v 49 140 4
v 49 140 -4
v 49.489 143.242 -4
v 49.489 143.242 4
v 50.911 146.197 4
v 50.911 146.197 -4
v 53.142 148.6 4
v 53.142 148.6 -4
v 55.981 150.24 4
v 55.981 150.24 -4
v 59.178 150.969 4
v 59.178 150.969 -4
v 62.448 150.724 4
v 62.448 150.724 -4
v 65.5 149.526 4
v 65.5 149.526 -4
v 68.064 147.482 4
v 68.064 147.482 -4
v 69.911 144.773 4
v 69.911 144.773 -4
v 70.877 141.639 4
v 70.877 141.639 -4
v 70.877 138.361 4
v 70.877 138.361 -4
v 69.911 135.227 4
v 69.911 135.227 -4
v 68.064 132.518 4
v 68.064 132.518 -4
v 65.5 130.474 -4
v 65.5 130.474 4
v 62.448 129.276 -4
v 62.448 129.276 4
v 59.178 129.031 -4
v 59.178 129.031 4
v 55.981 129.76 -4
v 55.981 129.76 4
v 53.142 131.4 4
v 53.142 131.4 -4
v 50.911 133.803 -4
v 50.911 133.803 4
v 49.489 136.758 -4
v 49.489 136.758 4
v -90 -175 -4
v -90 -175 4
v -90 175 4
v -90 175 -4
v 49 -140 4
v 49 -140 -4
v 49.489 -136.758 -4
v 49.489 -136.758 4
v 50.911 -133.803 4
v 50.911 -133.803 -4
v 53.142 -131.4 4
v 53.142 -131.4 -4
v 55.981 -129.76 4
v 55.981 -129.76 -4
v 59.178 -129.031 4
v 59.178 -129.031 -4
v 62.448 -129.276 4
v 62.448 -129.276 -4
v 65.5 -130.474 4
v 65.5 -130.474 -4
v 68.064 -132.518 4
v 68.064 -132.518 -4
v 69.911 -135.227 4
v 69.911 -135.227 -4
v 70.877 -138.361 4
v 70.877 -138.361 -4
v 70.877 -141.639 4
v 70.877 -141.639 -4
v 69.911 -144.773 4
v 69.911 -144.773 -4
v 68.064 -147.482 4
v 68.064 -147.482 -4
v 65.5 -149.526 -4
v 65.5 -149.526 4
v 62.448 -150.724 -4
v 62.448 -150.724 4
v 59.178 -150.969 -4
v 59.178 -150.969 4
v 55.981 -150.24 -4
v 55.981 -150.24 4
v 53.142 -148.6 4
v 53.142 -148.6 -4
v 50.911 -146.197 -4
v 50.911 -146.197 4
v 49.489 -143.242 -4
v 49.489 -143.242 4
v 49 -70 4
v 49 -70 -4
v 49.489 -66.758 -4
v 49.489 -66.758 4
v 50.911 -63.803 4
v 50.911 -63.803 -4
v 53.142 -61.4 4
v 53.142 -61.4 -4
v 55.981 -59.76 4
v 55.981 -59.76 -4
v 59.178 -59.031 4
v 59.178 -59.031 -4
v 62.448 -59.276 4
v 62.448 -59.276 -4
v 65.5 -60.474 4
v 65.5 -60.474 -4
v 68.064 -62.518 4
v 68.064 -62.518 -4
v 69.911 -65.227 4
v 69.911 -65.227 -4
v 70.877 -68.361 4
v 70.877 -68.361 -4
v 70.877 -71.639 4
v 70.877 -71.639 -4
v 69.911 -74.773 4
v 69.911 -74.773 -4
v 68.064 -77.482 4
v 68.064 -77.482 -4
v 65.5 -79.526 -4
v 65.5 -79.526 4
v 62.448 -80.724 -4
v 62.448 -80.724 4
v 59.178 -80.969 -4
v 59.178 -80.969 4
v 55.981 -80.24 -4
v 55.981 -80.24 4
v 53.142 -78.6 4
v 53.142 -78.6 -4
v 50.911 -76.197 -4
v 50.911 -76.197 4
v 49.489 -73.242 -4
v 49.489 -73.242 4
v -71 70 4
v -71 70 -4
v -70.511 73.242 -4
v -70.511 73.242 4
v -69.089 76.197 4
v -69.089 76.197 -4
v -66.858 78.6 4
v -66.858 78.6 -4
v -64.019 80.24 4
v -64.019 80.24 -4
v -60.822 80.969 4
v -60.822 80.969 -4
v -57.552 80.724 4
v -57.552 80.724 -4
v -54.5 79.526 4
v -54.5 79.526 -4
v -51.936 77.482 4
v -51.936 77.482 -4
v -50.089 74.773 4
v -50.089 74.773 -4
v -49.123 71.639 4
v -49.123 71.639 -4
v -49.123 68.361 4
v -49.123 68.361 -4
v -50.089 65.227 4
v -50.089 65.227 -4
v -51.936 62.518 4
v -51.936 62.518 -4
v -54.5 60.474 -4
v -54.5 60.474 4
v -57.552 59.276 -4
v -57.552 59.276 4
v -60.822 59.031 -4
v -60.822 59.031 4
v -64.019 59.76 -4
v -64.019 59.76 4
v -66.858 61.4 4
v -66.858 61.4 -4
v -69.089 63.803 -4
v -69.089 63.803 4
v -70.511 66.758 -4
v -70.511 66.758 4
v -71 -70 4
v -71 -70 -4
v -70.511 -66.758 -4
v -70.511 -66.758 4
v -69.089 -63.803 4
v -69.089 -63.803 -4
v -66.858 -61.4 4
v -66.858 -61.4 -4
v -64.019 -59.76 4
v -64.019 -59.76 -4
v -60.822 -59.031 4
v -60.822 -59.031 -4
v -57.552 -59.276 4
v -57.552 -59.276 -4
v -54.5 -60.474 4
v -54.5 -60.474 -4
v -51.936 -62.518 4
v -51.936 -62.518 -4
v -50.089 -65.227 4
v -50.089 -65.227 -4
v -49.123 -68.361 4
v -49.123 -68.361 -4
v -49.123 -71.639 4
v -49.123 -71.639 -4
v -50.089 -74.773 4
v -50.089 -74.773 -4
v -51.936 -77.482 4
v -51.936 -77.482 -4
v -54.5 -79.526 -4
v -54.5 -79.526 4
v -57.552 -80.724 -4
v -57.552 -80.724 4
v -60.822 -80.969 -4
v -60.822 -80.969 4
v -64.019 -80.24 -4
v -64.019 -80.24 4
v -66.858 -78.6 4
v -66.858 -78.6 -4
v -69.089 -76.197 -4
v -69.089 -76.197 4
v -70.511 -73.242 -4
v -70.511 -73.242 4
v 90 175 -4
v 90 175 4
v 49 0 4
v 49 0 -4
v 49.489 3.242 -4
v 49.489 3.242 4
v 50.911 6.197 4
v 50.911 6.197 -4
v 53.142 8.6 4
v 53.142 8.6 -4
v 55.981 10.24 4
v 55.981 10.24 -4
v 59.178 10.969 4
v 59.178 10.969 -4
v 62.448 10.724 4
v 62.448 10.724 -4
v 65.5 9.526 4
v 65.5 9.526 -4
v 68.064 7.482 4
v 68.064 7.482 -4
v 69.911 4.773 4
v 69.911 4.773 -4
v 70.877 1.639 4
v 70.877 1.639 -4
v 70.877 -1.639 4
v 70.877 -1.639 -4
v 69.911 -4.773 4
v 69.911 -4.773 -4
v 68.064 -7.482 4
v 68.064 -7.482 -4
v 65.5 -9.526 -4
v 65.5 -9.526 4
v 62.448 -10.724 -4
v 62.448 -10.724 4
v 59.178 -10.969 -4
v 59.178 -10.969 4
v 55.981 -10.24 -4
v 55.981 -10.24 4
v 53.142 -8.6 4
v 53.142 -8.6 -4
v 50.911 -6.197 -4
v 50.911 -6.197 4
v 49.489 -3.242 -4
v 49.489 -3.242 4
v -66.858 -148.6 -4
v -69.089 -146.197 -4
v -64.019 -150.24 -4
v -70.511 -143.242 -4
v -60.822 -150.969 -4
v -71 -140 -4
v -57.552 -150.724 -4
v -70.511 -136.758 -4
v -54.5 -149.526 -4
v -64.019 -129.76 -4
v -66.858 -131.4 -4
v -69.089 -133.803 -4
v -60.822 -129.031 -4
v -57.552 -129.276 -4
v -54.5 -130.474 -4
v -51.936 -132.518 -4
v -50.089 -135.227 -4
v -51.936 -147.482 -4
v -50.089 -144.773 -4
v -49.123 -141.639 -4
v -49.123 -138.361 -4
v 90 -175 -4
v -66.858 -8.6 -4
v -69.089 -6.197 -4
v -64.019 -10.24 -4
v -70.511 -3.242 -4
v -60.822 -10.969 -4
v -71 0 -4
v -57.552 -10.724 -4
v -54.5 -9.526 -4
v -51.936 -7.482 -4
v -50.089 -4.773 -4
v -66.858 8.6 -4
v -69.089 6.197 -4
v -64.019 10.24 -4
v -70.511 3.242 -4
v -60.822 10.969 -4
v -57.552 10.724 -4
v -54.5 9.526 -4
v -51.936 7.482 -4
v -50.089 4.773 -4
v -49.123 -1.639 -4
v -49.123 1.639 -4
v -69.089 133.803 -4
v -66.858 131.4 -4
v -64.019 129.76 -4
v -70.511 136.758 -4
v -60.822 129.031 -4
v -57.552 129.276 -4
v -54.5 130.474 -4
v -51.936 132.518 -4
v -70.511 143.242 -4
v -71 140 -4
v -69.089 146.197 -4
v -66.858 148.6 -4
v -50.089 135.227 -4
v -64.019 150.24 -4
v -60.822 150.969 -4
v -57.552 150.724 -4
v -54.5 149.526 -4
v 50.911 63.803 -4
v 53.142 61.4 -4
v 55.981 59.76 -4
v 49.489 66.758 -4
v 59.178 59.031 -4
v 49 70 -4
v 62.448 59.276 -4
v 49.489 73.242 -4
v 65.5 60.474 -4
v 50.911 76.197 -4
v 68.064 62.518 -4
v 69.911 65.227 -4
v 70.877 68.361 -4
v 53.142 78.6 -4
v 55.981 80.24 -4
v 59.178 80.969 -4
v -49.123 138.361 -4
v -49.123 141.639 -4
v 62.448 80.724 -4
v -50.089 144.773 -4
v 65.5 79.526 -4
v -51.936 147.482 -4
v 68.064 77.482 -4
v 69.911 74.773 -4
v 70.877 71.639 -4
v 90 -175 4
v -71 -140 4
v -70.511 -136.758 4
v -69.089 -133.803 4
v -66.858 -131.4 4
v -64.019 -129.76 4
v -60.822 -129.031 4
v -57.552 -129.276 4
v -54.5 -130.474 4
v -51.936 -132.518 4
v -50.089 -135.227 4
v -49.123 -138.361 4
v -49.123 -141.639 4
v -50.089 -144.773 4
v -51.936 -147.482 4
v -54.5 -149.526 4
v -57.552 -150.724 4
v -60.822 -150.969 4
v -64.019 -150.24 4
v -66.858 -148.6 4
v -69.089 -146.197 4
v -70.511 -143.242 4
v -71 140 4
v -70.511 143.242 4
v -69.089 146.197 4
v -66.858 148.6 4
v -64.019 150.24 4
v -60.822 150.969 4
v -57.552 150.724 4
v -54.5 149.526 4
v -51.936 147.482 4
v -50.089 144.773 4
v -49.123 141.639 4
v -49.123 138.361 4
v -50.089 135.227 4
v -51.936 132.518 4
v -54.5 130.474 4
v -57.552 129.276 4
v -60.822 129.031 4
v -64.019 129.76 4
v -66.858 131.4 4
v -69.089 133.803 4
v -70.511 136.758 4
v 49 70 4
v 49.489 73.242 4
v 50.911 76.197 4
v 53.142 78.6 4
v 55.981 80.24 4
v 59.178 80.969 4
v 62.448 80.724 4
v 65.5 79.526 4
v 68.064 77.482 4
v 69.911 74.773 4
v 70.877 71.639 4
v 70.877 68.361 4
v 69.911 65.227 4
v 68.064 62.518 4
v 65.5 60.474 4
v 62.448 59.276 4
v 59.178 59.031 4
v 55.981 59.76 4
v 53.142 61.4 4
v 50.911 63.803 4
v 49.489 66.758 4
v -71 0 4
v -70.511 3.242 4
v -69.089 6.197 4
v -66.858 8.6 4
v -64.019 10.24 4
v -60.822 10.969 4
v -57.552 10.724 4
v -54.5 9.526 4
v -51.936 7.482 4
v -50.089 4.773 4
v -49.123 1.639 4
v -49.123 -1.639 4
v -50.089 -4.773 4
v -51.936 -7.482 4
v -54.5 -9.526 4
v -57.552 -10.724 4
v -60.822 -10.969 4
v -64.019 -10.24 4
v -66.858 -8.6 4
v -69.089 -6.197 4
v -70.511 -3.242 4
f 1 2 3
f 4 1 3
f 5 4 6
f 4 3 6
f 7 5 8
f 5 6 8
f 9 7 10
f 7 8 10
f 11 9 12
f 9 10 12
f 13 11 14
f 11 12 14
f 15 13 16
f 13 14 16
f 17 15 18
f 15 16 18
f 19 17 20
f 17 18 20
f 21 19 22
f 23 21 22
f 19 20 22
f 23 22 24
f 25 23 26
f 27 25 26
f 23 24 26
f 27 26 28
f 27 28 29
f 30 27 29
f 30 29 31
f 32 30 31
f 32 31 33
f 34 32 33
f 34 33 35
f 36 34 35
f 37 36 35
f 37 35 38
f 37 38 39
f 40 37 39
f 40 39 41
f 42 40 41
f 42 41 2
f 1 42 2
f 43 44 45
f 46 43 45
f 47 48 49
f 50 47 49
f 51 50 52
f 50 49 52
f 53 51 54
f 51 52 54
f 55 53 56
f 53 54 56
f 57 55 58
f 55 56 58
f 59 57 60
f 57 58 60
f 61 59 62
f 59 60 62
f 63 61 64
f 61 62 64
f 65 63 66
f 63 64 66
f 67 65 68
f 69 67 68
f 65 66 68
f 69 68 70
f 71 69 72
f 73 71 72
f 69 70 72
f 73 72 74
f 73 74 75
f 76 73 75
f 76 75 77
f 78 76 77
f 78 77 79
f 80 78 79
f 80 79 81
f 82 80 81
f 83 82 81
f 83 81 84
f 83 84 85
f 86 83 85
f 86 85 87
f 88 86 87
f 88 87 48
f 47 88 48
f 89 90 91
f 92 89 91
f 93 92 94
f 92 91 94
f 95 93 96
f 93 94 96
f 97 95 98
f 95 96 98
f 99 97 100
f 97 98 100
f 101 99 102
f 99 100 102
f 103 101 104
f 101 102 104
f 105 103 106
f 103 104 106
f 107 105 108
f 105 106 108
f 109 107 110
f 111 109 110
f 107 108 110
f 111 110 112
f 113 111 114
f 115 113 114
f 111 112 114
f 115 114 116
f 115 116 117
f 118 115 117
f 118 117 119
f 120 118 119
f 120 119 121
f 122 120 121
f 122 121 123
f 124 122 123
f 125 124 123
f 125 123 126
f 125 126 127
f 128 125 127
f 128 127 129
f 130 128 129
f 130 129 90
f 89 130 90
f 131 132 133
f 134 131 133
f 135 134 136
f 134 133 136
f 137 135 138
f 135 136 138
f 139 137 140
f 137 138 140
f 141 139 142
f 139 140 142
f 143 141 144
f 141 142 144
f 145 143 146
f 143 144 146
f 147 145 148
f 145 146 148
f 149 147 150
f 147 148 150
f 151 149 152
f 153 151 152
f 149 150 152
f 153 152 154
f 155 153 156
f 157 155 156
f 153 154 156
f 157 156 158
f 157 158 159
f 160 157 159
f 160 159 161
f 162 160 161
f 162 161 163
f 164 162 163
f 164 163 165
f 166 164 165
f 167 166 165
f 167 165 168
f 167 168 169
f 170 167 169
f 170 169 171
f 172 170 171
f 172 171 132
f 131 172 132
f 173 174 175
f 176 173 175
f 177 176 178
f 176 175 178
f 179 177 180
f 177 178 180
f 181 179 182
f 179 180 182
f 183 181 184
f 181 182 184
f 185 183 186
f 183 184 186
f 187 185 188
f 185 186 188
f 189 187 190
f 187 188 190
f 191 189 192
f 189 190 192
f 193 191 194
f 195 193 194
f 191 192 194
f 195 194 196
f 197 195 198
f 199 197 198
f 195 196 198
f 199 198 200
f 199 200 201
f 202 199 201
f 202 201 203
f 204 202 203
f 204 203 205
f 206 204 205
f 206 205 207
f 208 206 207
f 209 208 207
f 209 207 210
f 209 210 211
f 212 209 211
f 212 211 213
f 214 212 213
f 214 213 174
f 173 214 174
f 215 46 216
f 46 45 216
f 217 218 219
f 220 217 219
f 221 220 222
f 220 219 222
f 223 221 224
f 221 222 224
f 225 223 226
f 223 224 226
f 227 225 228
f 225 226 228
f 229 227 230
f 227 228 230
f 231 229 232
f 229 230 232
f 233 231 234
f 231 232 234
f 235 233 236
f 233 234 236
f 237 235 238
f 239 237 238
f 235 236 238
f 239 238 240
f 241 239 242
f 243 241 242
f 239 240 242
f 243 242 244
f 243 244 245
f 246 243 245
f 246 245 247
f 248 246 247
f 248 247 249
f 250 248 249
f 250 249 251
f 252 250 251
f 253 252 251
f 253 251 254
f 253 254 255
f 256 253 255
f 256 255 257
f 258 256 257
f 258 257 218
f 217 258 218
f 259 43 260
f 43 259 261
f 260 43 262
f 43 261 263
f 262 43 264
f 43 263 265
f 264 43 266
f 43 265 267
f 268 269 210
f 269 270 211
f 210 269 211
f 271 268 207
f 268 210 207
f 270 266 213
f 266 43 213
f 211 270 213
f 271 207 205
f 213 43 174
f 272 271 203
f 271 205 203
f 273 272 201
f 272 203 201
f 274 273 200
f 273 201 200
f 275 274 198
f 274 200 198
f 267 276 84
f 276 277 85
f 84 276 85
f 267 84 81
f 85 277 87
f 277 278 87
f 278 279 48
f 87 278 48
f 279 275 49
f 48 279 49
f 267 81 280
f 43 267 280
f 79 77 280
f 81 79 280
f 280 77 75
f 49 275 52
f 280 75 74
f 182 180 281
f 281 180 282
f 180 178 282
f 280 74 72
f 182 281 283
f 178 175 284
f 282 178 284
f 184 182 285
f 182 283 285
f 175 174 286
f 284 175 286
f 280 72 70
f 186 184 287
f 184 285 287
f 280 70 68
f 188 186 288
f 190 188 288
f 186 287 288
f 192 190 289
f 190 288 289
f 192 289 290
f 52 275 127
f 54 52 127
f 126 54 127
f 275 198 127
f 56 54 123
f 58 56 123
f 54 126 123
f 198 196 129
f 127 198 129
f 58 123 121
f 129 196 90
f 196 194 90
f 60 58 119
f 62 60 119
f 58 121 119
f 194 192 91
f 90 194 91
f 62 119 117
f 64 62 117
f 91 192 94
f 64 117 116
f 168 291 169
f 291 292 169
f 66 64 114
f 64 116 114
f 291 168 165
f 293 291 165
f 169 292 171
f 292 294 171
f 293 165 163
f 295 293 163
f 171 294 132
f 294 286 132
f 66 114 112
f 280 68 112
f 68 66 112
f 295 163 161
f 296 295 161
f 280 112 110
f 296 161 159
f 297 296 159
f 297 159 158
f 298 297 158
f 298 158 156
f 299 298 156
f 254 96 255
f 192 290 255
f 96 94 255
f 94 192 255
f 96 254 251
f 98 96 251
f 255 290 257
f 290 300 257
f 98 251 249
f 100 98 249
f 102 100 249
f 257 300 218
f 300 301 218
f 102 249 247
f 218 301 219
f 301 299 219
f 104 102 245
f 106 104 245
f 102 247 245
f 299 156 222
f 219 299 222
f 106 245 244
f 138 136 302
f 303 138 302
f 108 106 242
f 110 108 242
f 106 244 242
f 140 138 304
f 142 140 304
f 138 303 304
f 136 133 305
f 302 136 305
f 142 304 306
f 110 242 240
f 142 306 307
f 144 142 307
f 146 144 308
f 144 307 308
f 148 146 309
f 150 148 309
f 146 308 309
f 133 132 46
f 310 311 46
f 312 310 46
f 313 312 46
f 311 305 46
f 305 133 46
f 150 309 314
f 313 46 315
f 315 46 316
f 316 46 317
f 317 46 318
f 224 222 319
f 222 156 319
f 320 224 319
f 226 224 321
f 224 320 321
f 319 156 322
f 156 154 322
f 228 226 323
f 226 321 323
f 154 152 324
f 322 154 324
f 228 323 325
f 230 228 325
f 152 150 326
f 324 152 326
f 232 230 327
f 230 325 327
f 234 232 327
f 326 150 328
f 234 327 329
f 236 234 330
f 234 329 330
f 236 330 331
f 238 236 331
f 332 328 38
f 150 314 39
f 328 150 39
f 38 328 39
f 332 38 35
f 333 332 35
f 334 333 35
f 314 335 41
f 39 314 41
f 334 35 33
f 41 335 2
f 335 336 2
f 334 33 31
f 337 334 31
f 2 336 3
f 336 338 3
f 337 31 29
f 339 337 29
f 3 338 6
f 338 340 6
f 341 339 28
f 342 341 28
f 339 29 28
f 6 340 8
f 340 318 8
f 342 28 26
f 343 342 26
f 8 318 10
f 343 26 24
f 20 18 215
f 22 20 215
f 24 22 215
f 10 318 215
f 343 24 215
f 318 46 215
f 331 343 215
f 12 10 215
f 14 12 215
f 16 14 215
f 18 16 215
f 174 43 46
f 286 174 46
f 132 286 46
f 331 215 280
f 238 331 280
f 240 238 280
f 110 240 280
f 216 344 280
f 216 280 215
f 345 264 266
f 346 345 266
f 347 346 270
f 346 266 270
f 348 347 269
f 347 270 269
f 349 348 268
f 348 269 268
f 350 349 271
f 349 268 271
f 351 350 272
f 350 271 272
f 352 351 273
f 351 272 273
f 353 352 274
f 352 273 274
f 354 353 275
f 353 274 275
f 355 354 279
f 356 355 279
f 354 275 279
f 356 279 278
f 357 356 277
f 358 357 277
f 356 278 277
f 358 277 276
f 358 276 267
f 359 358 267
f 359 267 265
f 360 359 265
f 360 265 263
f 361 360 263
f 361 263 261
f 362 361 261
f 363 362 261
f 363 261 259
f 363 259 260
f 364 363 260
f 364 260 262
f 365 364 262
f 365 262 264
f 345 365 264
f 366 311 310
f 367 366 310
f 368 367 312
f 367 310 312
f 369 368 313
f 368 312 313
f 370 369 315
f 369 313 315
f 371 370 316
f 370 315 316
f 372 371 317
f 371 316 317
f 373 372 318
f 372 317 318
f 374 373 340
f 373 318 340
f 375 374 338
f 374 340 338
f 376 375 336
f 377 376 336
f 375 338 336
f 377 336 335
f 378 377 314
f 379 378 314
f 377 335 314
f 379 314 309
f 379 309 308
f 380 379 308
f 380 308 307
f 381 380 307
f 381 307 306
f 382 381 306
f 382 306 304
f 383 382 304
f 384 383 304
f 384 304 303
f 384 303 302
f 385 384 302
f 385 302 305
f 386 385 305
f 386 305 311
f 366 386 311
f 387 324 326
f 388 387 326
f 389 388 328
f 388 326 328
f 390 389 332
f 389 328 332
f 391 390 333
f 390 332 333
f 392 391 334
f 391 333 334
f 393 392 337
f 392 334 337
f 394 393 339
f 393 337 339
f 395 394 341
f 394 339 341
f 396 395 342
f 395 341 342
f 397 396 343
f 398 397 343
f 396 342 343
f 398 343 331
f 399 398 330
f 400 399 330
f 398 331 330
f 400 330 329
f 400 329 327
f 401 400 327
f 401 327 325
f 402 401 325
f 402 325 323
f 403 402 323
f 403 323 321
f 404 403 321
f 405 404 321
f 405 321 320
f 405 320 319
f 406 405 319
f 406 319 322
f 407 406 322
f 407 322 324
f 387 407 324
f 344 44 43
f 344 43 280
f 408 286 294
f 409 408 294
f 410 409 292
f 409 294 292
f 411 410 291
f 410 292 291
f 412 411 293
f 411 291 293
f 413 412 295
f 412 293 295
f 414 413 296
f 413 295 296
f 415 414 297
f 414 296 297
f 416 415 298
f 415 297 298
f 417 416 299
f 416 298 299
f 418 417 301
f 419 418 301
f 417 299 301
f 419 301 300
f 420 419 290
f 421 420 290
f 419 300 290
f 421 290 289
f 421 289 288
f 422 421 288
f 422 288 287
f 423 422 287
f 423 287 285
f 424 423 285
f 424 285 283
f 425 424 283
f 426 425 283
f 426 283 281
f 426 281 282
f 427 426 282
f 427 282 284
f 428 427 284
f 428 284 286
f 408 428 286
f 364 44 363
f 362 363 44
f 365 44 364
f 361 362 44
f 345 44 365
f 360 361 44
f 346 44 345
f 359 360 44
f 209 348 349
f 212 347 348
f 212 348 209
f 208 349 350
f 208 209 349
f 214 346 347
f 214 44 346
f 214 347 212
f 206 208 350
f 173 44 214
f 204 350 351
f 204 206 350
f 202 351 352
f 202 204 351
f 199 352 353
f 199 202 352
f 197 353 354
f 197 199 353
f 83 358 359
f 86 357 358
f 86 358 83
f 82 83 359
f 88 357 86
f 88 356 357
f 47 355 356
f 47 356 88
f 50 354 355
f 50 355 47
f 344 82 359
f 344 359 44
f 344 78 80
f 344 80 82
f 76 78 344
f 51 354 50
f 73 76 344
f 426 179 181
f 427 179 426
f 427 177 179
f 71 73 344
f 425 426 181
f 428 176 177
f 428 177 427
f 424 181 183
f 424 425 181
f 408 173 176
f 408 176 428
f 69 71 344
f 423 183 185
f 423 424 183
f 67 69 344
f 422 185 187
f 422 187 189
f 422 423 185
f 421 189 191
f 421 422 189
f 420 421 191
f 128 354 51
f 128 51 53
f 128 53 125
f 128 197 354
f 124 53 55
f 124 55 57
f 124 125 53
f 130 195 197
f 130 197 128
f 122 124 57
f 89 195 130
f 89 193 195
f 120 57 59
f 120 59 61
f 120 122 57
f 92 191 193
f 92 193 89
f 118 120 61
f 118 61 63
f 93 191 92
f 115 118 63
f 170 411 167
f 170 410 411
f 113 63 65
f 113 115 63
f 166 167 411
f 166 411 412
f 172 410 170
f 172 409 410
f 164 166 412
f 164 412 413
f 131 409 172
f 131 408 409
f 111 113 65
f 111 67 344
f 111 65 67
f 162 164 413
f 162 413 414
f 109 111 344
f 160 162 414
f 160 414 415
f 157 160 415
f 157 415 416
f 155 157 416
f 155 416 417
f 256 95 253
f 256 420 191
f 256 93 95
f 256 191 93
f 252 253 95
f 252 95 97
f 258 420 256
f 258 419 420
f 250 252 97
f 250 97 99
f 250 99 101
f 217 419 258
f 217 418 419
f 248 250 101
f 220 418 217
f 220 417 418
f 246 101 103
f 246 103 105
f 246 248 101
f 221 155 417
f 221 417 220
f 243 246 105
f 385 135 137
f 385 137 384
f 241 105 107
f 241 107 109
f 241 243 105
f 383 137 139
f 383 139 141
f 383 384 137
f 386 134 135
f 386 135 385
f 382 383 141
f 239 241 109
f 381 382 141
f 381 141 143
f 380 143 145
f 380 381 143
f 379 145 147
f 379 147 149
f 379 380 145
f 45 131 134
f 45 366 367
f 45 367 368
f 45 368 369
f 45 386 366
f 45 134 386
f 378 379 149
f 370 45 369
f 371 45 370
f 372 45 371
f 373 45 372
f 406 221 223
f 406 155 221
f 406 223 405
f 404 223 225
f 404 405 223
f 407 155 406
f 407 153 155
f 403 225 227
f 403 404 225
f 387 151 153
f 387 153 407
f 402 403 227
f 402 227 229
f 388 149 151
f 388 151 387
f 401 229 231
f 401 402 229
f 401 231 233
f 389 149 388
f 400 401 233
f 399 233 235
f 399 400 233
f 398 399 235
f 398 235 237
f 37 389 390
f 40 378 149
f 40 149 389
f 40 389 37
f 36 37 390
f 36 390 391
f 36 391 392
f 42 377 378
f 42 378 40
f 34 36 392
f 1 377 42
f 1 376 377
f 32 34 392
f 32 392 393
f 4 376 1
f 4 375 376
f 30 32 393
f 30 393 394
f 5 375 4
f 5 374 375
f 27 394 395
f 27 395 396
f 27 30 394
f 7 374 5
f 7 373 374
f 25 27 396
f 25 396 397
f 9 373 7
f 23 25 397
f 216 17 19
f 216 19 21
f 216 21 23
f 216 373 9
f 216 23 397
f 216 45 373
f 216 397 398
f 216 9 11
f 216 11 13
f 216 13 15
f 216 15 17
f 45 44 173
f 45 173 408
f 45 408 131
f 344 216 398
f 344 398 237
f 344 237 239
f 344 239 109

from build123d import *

# Parameters (mm, degrees)
SKETCH1_W                  = 180
SKETCH1_H                  = 350
BOSS_EXTRUDE1_DEPTH        = 4
F_22_0_22_DIAMETER_HOLE1_D = 22
LPATTERN1_COUNT            = 5
LPATTERN1_PITCH            = 70


with BuildPart() as part:
    # Sketch1 → Boss-Extrude1 (new, symmetric)
    with BuildSketch(Plane.XY):
        Rectangle(SKETCH1_W, SKETCH1_H)
    extrude(amount=BOSS_EXTRUDE1_DEPTH, both=True)

    # Ø22.0 (22) Diameter Hole1 (through all)
    with Locations(Plane.XY.offset(4)):
        with Locations((-60, 140), (60, 140)):
            f_22_0_22_diameter_hole1 = Hole(F_22_0_22_DIAMETER_HOLE1_D / 2)

    # LPattern1: Ø22.0 (22) Diameter Hole1 ×5
    with Locations(*[(0, -i * LPATTERN1_PITCH, 0) for i in range(1, LPATTERN1_COUNT)]):
        add(f_22_0_22_diameter_hole1, mode=Mode.SUBTRACT)


solid = part.part
